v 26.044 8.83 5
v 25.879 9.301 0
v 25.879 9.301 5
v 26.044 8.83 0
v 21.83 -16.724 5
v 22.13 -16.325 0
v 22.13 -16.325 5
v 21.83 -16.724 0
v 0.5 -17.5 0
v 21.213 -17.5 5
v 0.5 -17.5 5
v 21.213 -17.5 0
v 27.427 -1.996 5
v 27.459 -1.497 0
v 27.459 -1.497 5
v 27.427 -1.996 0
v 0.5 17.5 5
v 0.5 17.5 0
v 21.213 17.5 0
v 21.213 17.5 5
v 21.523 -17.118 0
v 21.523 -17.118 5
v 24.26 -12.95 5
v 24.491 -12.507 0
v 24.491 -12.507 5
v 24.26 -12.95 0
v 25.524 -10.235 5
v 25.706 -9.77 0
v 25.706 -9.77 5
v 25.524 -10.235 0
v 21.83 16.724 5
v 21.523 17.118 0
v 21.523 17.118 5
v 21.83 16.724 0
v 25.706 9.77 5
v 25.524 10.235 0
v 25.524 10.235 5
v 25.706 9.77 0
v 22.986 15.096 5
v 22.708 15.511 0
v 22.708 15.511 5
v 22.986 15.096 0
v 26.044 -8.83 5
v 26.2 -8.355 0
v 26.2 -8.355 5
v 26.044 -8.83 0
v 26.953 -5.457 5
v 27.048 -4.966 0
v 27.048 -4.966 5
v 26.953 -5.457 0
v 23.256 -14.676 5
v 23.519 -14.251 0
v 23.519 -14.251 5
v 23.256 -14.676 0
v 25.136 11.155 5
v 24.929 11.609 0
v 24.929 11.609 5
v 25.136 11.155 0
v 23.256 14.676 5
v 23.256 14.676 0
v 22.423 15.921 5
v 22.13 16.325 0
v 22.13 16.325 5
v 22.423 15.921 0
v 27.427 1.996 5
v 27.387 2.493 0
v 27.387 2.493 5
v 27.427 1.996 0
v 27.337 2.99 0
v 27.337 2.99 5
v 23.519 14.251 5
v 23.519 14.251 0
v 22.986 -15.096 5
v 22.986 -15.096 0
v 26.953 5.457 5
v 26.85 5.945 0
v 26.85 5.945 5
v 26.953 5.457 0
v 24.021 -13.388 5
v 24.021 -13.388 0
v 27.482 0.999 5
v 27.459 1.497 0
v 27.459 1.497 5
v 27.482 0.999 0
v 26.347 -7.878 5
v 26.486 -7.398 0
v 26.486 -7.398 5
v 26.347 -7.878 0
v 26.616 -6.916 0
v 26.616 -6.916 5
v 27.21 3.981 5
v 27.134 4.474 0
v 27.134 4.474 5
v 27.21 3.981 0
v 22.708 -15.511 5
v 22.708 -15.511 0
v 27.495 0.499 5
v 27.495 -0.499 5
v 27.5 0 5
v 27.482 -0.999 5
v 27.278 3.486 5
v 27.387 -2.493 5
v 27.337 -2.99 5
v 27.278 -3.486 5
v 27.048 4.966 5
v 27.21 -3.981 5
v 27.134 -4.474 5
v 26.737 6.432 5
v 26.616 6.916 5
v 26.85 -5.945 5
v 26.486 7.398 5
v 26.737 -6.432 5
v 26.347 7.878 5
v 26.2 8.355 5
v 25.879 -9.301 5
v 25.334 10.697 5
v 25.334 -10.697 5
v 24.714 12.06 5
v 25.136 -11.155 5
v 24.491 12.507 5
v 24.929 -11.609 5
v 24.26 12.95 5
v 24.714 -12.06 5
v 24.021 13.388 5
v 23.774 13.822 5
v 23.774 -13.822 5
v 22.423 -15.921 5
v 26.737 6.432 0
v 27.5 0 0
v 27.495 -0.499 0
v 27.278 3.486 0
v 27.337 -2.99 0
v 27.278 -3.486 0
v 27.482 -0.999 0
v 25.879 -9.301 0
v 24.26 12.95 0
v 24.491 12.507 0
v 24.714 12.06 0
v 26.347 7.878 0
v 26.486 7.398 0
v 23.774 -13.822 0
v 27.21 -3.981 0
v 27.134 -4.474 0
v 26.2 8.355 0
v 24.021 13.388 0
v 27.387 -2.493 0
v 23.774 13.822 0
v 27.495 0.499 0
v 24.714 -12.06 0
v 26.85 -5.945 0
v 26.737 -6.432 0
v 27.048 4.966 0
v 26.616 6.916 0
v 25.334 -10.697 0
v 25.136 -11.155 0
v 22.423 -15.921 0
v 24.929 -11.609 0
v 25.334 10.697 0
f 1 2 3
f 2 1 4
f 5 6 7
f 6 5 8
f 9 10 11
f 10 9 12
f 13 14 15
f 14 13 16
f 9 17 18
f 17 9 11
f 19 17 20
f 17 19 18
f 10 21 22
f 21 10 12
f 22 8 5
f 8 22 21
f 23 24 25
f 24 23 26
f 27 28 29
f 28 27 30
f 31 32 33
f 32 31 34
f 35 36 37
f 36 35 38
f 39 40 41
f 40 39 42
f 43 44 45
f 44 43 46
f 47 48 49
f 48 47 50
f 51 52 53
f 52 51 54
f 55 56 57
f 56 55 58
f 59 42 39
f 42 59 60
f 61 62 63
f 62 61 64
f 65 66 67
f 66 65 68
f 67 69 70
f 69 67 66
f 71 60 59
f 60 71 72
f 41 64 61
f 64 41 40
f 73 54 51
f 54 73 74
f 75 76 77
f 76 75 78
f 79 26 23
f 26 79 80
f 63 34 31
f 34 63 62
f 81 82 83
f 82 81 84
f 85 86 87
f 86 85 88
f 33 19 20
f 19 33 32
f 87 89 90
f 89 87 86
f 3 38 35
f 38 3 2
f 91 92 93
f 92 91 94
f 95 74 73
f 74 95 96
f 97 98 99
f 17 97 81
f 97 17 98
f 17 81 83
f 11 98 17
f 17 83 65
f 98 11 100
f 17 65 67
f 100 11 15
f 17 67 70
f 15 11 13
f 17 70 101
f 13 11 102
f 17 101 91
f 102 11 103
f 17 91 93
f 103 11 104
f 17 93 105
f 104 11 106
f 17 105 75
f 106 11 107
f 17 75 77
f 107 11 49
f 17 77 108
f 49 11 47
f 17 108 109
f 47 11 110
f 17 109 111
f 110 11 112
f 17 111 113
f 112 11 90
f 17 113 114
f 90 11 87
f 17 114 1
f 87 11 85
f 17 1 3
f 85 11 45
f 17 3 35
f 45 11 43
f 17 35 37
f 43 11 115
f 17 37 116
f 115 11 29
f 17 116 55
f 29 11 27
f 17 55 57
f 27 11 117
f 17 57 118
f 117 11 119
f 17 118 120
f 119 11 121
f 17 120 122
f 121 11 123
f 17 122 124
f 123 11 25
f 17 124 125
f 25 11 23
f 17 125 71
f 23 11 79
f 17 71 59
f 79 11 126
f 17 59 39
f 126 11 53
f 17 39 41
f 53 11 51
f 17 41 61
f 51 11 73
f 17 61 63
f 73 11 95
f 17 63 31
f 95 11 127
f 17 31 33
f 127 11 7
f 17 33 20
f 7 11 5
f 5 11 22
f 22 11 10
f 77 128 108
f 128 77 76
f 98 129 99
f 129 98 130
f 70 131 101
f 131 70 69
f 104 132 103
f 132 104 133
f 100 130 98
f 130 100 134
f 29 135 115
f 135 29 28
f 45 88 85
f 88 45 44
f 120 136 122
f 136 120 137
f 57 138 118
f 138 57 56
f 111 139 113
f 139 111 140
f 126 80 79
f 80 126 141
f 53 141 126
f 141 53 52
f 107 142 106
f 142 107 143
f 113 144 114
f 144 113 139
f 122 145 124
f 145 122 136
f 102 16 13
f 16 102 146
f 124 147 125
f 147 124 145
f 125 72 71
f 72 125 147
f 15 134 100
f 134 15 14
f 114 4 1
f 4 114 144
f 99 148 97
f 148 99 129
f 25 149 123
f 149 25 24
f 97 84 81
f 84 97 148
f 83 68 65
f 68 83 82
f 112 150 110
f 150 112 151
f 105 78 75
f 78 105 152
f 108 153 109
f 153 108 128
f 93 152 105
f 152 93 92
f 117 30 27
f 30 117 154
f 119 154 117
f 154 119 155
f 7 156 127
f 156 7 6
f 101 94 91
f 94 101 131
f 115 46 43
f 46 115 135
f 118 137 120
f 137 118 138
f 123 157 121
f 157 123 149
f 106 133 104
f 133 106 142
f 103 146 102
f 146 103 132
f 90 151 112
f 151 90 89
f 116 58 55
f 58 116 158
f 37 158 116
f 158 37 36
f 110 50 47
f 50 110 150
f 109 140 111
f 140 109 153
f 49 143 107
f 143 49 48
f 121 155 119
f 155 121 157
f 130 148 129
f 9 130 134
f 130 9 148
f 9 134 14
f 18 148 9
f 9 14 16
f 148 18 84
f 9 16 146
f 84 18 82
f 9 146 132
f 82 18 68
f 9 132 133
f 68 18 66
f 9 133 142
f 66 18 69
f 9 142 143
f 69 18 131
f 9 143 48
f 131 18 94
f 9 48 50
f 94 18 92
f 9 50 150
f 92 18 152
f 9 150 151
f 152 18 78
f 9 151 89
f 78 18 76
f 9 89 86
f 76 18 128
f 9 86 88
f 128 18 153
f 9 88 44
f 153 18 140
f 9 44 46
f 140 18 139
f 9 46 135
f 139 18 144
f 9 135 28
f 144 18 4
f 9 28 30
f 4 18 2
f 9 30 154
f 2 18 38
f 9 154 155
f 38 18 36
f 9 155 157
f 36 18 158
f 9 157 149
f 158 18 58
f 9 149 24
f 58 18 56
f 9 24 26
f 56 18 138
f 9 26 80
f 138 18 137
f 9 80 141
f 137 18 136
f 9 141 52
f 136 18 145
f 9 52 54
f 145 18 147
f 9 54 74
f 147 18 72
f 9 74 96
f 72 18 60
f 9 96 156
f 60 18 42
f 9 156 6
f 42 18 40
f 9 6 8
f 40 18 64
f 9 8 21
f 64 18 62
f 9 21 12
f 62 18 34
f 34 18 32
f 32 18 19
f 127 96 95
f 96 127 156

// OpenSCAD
$fa=1/2;
$fs=1/2;
thickness=5;
od=55;
width=35;
tooth=2;
linear_extrude(thickness) {
  intersection() {
    circle(d=od);
    translate([tooth/4,-width/2]) square([od,width]);
  }
}
rotate([90,0,0])linear_extrude(width,center=true) {
  intersection() {
    translate([-tooth/4,0]) square([tooth/2,thickness]);
    for (tr=[0:tooth:thickness]) translate([0,tr]) polygon([[-tooth/4,tooth/2],[tooth/4,tooth],[tooth/4,0]]);
  }
}

/*
id=8;
slices=32;
part="button";//[button,sector]
if (part=="button") {
  cylinder(h=thickness,d=id*2);
  cylinder(h=thickness*2,d=id);
}

if (part=="sector") linear_extrude(thickness) {
  intersection() {
    difference() {
      circle(d=od);
      circle(d=id);
    }
  polygon([[0,0],[od,0],od*[cos(360/slices),sin(360/slices)]]);
  }
}
*/
